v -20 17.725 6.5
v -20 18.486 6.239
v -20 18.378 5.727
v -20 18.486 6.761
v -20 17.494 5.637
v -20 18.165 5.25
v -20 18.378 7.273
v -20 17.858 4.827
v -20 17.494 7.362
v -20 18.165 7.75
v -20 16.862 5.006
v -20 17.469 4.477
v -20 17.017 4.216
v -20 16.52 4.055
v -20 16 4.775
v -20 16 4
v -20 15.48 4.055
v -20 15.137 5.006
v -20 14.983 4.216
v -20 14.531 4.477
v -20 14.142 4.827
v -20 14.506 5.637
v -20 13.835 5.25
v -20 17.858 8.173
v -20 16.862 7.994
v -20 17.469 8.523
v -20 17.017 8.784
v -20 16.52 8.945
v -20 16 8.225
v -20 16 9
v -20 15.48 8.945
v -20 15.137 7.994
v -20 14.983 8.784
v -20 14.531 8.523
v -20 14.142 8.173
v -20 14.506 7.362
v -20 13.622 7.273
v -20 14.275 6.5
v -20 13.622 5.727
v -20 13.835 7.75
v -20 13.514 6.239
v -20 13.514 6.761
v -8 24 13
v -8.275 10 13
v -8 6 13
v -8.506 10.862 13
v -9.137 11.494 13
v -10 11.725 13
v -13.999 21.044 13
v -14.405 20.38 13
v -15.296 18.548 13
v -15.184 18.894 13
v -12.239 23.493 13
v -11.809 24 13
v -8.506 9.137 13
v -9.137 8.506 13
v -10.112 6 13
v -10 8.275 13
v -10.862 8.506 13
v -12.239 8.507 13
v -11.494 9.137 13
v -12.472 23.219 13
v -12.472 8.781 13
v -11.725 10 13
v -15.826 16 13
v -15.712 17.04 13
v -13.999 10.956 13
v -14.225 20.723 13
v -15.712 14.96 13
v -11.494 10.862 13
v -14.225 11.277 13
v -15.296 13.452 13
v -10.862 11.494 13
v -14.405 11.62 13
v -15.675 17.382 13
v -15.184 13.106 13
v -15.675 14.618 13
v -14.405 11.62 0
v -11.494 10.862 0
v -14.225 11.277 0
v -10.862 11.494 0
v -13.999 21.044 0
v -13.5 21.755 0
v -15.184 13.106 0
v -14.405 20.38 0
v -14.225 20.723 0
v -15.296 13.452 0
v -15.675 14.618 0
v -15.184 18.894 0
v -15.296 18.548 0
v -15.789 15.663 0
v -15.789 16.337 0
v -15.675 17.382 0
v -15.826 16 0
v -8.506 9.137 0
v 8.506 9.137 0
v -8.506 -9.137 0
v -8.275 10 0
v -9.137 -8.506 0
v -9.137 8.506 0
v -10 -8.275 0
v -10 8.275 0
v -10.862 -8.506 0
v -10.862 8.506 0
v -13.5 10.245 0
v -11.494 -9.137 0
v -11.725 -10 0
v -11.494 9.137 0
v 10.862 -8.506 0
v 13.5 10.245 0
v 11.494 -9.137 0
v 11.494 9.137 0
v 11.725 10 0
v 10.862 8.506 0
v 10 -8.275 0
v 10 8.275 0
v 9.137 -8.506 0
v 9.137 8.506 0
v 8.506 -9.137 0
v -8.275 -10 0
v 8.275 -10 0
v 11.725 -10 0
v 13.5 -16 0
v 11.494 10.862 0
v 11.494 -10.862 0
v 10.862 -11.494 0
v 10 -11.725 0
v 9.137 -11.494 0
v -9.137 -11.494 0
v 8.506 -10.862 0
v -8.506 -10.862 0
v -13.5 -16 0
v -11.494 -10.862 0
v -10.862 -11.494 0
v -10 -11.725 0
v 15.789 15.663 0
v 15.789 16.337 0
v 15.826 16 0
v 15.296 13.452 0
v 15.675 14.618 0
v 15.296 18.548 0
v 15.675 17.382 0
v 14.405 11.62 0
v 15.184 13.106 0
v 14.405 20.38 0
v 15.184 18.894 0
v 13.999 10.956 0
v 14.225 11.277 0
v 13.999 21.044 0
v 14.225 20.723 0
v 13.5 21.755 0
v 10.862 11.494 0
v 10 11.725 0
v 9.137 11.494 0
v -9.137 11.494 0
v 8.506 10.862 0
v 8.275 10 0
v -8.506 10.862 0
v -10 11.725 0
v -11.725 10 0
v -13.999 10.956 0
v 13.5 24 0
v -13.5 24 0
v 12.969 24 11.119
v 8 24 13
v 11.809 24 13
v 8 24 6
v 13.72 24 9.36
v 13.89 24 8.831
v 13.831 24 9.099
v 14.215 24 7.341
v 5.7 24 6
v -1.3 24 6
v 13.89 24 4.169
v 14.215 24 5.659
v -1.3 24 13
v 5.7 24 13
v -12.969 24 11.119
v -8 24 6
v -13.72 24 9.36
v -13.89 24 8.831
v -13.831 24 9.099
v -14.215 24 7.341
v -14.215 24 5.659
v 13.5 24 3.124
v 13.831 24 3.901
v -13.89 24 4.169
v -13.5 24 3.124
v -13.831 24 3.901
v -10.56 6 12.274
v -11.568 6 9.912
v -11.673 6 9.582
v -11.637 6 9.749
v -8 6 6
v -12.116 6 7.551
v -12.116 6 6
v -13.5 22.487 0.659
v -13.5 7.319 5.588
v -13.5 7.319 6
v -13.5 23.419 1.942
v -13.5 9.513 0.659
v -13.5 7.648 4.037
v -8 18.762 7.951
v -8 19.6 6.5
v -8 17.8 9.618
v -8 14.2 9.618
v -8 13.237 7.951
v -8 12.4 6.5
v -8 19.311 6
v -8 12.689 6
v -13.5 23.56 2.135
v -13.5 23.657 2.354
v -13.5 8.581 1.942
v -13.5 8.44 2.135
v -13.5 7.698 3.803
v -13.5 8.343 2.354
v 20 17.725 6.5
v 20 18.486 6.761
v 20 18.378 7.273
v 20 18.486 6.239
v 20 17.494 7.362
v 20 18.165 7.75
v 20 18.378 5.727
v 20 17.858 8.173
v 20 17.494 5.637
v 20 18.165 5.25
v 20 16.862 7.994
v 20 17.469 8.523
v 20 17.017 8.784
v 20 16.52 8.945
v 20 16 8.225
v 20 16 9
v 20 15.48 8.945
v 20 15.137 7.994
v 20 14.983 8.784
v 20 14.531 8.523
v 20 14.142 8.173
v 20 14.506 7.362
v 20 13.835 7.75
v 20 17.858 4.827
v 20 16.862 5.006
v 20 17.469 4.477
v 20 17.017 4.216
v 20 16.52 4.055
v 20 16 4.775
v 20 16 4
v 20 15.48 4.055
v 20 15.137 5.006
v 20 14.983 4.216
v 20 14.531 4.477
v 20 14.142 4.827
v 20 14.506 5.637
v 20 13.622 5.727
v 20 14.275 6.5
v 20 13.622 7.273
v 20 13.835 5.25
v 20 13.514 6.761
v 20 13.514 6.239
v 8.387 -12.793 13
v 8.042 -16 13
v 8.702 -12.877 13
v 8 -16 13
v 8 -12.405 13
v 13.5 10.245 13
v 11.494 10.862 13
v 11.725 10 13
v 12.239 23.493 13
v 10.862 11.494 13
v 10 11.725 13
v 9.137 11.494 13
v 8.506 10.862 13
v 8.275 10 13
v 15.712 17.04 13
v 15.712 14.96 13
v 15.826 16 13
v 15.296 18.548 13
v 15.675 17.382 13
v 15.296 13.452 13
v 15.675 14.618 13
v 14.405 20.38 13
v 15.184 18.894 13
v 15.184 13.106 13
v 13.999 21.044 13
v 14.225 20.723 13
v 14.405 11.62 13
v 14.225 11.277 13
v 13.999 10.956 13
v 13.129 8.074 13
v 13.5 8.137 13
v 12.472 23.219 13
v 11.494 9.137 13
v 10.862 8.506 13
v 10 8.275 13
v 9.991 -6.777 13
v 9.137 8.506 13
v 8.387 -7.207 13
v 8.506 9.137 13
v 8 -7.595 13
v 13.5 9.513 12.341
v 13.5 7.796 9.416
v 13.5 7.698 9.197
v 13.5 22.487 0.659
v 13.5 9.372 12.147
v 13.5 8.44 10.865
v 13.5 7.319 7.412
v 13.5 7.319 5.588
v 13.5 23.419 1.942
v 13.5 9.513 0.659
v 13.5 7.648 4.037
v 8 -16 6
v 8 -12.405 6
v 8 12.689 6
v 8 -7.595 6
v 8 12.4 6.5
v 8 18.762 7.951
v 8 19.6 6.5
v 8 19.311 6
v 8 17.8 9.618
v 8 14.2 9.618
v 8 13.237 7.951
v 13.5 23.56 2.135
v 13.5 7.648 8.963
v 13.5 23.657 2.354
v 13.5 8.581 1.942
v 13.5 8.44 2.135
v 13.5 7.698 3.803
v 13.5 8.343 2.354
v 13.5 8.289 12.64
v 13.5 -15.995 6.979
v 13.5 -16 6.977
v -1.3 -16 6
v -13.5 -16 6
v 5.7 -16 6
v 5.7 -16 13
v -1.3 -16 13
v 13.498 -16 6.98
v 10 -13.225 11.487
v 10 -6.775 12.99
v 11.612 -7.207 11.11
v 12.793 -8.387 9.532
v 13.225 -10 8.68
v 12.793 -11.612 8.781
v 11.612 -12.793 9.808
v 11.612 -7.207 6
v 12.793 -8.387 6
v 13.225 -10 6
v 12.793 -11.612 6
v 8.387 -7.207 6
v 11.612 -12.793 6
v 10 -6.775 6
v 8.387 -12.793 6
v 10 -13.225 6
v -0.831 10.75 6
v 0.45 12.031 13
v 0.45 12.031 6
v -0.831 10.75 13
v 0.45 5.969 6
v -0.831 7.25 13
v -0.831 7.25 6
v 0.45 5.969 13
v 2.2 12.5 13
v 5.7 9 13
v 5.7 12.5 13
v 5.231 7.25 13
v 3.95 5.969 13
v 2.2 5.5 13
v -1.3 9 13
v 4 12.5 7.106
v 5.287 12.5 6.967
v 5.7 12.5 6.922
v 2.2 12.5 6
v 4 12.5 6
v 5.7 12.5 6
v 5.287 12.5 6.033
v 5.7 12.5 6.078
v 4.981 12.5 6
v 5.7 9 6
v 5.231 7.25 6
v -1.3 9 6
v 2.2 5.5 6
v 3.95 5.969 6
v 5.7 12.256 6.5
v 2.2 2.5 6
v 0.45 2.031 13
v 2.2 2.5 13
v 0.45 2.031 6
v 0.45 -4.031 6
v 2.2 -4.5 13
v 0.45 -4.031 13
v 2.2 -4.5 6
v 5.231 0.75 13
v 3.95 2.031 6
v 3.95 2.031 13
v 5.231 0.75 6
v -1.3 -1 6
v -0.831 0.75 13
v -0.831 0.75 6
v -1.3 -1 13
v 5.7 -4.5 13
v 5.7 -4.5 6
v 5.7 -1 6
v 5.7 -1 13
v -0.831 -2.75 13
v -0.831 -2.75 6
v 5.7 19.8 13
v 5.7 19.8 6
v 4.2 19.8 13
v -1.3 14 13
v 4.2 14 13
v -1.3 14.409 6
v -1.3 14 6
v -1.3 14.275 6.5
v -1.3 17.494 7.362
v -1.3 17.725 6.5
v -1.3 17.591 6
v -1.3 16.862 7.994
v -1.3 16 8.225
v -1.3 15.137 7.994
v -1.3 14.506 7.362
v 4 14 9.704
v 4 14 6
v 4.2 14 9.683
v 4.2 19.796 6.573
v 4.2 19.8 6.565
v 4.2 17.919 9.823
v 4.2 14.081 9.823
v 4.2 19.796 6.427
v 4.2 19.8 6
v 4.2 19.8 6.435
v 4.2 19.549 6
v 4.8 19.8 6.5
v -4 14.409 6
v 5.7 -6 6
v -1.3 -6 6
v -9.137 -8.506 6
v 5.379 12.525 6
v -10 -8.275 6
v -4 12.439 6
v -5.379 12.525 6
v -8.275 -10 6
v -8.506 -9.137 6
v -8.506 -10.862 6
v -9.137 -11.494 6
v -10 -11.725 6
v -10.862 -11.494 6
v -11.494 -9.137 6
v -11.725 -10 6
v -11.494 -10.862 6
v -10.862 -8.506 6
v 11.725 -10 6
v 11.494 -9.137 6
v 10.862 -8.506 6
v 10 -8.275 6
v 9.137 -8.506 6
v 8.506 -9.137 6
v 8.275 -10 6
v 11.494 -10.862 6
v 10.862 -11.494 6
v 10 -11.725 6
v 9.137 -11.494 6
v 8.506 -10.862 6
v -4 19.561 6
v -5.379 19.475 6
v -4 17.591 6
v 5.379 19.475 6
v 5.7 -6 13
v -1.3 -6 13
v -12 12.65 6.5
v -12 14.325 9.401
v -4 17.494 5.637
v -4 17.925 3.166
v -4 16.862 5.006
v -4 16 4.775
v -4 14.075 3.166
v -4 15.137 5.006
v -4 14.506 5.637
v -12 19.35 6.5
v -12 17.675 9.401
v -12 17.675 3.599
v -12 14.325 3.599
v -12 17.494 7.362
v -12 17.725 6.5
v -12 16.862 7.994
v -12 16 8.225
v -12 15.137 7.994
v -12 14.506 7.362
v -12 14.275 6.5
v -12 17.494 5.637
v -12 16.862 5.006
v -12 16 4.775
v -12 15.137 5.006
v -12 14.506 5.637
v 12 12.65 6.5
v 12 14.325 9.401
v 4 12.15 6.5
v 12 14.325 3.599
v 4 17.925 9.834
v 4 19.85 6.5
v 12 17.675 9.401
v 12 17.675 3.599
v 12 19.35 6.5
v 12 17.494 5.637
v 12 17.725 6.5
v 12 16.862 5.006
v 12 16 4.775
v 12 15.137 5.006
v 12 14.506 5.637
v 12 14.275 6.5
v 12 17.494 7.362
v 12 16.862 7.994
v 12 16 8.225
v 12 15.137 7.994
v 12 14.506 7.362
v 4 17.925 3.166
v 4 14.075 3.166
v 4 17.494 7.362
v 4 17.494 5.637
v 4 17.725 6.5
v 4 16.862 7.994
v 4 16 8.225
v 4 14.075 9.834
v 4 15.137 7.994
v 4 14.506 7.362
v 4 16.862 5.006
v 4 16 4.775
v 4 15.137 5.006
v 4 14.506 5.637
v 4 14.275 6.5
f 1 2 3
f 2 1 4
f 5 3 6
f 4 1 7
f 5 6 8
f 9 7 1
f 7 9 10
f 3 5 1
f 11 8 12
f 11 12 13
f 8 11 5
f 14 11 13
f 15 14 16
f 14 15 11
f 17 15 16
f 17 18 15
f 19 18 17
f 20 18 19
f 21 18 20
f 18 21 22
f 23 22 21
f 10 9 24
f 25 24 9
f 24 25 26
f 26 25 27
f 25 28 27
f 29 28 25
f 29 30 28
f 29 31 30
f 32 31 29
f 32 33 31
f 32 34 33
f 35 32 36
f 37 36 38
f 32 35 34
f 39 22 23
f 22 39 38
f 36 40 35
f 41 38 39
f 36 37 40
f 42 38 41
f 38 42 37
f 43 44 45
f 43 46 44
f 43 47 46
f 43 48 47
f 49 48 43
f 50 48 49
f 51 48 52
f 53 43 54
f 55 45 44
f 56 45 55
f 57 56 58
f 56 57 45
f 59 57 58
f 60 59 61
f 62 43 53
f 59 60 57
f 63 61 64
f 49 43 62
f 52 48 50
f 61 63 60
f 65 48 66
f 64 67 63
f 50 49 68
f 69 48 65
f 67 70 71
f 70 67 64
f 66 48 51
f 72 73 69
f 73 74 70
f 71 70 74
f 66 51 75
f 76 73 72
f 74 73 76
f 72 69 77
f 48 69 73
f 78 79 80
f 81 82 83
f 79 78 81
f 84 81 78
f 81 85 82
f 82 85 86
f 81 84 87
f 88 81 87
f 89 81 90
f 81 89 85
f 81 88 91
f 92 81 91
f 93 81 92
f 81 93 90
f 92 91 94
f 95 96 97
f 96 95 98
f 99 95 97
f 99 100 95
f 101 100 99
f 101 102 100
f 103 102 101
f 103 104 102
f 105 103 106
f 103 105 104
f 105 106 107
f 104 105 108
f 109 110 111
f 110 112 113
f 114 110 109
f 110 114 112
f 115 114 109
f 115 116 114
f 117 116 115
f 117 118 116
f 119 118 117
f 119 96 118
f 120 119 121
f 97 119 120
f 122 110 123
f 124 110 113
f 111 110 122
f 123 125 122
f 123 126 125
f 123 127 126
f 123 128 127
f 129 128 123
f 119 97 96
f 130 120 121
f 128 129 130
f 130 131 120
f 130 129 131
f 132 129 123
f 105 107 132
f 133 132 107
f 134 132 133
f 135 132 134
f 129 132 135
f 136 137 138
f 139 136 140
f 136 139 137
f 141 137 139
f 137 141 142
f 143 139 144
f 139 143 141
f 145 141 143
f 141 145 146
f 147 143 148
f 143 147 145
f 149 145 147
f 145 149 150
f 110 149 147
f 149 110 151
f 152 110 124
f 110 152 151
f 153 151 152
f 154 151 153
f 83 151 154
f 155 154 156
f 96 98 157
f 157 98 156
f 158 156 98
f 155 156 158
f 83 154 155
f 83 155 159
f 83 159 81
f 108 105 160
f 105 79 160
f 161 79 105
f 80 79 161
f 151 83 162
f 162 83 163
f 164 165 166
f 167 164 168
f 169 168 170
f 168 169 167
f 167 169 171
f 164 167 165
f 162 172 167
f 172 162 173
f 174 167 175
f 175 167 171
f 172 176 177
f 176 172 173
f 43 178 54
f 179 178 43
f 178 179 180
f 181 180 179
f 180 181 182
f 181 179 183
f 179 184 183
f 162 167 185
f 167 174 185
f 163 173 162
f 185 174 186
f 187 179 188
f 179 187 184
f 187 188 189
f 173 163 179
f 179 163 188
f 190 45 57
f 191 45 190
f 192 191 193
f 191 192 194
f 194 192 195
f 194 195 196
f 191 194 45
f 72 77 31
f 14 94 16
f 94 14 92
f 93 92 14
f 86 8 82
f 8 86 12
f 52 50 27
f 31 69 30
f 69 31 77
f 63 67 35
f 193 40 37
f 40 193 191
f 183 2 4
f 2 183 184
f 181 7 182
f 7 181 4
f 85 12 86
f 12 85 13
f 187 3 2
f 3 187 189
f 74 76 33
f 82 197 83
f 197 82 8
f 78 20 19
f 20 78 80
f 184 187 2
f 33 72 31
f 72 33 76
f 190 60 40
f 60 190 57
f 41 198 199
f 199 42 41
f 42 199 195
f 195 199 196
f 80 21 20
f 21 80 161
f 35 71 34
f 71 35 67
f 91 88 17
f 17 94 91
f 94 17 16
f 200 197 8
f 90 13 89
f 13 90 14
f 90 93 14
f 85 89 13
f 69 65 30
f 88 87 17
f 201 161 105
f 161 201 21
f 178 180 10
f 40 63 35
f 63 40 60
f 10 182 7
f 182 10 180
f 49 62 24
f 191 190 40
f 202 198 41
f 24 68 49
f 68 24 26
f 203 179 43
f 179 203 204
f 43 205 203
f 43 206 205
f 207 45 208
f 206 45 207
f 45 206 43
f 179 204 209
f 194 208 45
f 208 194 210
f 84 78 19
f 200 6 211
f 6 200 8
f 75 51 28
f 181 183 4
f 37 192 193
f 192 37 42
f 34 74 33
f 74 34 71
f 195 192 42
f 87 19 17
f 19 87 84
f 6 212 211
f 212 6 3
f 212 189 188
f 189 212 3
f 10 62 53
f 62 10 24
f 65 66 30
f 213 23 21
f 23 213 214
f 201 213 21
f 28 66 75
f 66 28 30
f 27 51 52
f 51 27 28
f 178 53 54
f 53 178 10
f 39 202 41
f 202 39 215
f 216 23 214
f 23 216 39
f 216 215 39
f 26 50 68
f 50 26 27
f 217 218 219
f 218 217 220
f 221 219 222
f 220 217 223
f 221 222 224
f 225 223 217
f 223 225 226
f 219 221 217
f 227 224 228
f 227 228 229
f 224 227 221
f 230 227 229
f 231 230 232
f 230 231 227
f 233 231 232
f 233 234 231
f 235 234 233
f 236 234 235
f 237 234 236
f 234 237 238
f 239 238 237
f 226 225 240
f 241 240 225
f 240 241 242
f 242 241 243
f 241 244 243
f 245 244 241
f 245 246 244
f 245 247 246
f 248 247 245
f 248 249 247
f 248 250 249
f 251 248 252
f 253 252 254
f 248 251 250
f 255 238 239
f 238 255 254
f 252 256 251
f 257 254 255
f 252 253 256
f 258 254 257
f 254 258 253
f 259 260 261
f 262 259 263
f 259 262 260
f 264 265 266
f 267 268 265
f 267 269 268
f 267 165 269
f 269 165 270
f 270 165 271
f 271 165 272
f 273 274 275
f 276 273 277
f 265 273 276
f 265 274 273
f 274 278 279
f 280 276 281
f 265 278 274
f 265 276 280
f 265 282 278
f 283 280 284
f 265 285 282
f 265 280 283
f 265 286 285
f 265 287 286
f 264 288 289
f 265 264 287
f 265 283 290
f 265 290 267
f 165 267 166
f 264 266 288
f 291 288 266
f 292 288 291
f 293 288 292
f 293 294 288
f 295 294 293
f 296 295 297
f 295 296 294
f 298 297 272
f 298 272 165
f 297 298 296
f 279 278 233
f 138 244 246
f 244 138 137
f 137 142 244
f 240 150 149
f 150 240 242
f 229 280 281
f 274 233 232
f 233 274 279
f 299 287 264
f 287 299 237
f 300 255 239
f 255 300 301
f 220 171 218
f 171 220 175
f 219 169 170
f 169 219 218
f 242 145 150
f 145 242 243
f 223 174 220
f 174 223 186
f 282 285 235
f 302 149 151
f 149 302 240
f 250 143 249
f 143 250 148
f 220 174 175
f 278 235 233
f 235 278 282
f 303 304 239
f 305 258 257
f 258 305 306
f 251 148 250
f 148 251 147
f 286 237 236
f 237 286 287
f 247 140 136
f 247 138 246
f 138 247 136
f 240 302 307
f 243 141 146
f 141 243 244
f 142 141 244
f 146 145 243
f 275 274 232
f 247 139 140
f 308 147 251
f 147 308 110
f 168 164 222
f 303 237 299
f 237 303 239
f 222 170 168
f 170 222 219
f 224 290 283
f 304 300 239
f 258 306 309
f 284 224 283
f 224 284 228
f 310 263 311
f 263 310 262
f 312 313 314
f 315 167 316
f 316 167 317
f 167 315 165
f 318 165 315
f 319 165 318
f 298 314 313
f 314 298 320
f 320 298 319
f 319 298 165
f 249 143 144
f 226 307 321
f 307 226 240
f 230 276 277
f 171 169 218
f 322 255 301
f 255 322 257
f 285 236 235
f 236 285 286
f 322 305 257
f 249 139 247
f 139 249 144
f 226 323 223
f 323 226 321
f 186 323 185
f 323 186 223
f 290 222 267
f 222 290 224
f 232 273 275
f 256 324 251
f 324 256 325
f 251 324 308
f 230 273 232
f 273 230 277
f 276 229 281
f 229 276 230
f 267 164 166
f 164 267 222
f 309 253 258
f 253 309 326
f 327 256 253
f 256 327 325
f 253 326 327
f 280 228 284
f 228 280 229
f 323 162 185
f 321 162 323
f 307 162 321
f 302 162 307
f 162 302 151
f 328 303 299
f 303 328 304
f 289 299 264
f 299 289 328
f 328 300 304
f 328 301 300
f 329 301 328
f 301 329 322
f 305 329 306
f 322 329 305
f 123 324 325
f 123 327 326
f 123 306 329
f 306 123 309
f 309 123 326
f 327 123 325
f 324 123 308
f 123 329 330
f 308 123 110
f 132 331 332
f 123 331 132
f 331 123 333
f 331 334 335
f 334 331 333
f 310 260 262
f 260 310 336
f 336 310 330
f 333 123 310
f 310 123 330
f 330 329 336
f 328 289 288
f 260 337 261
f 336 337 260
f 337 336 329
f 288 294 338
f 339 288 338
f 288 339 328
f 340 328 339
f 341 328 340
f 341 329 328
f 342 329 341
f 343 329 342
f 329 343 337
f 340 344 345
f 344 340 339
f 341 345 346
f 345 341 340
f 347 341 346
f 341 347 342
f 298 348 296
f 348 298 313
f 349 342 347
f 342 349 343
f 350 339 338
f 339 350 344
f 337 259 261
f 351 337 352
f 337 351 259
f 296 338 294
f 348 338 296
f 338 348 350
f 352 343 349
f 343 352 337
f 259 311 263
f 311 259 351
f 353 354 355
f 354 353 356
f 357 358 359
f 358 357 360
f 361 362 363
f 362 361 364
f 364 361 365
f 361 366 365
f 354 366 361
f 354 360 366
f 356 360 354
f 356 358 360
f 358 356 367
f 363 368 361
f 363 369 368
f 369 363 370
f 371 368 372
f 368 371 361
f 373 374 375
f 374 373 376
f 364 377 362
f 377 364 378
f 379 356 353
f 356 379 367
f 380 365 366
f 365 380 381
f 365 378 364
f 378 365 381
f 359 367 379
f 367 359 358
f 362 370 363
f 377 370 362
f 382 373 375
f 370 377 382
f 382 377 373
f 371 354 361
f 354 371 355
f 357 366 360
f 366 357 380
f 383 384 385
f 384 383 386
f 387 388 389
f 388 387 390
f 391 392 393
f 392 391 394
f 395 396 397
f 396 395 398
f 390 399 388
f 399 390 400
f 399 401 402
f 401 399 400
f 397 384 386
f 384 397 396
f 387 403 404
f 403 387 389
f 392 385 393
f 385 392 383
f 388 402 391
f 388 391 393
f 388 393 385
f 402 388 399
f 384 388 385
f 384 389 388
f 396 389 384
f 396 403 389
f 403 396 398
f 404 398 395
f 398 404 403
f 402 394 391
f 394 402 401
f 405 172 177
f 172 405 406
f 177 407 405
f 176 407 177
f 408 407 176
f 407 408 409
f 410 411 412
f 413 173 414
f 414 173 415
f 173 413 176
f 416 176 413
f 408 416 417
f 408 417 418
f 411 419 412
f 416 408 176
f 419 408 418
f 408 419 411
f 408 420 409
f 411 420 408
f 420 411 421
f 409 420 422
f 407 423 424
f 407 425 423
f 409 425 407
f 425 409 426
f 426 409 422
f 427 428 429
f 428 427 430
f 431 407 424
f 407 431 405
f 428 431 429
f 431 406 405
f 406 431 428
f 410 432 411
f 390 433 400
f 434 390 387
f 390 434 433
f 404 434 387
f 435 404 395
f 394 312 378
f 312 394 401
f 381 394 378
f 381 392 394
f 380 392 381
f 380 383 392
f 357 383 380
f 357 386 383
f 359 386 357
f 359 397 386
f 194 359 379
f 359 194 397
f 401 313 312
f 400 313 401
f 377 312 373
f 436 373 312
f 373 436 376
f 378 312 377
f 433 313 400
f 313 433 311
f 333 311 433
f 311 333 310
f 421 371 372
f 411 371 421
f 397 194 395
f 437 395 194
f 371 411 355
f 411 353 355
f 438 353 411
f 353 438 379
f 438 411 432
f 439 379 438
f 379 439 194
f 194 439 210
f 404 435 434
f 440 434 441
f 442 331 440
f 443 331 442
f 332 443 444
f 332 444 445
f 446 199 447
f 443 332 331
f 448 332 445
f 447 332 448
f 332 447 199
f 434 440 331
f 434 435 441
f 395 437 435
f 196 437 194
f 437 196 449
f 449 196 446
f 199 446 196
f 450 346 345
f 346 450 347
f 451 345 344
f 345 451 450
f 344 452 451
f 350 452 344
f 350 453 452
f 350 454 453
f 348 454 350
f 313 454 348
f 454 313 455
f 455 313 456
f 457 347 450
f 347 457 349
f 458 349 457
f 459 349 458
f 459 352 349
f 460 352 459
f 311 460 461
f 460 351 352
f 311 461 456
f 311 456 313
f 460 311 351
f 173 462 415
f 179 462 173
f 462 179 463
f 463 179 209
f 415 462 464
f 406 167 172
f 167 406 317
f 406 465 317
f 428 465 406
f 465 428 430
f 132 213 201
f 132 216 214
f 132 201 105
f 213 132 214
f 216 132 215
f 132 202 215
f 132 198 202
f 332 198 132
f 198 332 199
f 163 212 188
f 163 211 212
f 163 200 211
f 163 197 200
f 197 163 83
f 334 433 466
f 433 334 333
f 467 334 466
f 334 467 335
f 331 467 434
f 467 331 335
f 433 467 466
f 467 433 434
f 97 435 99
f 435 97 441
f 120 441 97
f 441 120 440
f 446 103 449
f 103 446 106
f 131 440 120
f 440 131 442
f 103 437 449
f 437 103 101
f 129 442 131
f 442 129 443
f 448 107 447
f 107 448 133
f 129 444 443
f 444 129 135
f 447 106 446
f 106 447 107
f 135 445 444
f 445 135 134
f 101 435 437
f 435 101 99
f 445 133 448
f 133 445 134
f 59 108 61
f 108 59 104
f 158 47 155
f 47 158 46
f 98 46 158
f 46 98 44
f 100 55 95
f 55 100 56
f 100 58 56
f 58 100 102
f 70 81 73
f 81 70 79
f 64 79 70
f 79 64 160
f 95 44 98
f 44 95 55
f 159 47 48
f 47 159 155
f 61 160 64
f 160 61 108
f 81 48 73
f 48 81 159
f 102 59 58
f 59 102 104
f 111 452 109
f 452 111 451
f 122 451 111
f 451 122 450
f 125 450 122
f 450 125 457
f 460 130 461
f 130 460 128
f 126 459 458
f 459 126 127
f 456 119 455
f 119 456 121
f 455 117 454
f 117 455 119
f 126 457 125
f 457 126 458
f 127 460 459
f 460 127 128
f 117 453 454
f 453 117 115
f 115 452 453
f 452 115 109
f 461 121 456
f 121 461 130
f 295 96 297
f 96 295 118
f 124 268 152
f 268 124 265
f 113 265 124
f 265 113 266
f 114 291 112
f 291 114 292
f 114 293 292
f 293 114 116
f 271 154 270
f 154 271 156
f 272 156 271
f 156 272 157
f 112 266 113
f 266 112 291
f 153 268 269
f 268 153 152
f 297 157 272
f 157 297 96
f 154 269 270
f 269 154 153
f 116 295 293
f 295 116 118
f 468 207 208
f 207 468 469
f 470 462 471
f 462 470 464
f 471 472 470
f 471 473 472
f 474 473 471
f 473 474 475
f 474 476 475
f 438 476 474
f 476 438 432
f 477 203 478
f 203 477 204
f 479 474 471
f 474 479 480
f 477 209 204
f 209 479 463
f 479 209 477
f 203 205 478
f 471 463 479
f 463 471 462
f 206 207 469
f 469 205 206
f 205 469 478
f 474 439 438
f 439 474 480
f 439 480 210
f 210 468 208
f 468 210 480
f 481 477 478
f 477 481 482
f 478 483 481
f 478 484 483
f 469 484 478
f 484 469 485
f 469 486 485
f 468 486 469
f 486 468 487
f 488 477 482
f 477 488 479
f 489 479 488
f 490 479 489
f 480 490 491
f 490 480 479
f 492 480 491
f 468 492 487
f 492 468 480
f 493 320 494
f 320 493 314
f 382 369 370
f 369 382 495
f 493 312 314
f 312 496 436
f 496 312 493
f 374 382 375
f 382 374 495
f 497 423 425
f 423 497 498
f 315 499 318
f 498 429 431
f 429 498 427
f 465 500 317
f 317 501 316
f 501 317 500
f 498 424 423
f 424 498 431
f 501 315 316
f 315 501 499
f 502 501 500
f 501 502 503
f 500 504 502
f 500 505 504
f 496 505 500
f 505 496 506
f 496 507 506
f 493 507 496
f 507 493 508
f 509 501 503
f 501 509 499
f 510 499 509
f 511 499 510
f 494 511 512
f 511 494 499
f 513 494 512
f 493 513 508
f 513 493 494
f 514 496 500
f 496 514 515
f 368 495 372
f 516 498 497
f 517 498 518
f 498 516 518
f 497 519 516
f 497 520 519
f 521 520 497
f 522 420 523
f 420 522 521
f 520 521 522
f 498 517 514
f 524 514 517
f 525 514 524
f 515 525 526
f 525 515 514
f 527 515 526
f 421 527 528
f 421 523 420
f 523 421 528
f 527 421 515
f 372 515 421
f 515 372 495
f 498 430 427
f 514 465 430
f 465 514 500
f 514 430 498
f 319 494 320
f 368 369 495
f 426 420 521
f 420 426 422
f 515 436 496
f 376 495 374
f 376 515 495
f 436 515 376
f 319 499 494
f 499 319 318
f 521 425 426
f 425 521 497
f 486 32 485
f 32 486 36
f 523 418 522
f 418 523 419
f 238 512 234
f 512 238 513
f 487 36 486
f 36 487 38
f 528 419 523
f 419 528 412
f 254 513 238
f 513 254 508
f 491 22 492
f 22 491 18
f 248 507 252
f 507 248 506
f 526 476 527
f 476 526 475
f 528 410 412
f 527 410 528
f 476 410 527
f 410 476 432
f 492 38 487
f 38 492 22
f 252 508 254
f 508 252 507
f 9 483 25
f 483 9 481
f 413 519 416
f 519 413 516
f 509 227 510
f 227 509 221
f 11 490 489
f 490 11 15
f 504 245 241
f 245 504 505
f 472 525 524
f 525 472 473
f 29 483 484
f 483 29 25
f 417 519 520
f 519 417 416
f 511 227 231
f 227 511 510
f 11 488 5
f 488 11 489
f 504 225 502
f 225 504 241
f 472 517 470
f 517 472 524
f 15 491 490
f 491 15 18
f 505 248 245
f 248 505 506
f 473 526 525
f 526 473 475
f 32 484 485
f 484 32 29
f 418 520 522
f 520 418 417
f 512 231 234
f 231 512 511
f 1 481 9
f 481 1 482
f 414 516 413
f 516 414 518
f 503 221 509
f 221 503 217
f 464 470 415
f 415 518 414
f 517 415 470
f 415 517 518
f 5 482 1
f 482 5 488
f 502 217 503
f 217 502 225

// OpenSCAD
// file: configuration.scad
// Increase this if your slicer or printer make holes too tight.
extra_radius = 0.1;

// OD = outside diameter, corner to corner.
m3_nut_od = 6.1;
m3_nut_radius = m3_nut_od/2 + 0.2 + extra_radius;
m3_washer_radius = 3.5 + extra_radius;
m3_nut_thickness = 2.35;
m3_nyloc_thickness = 3.85;

// Major diameter of metric 3mm thread.
m3_major = 2.85;
m3_radius = m3_major/2 + extra_radius;
m3_wide_radius = m3_major/2 + extra_radius + 0.2;

// NEMA17 stepper motors.
motor_shaft_diameter = 5;
motor_shaft_radius = motor_shaft_diameter/2 + extra_radius;

// Frame brackets. M3x8mm screws work best with 3.6 mm brackets.
thickness = 3.6;

// OpenBeam or Misumi. Currently only 15x15 mm, but there is a plan
// to make models more parametric and allow 20x20 mm in the future.
extrusion = 15;

// Placement for the NEMA17 stepper motors.
motor_offset = 44;
motor_length = 47;
// main file
include <configuration.scad>;

separation = 40;
thickness = 6;

horn_thickness = 13;
horn_x = 8;

belt_width = 5;
belt_x = 5.6;
belt_z = 7;
corner_radius = 3.5;

module carriage() {
  // Timing belt (up and down).
  translate([-belt_x, 0, belt_z + belt_width/2]) %
    cube([1.7, 100, belt_width], center=true);
  translate([belt_x+1.23, 0, belt_z + belt_width/2]) %
    cube([2.3, 100, belt_width], center=true);
  difference() {
    union() {
      // Main body.
      translate([0, 4, thickness/2])
        cube([27, 40, thickness], center=true);
      // Ball joint mount horns.
      for (x = [-1, 1]) {
        scale([x, 1, 1]) intersection() {
          translate([0, 15, horn_thickness/2])
            cube([separation, 18, horn_thickness], center=true);
          translate([horn_x, 16, horn_thickness/2]) rotate([0, 90, 0])
            cylinder(r1=14, r2=2.5, h=separation/2-horn_x);
        }
      }

      // Avoid touching diagonal push rods (carbon tube).
      difference() {
        translate([10.75, 2.5, horn_thickness/2+1])
          cube([5.5, 37, horn_thickness-2], center=true);

        translate([23, -12, 12.5]) rotate([30, 40, 30])
          cube([40, 40, 20], center=true);
        translate([10, -10, 0])
          cylinder(r=m3_wide_radius+1.5, h=100, center=true, $fn=12);

      }

      // Belt clamps
      for (y = [[9, -1], [-1, 1]]) {
        translate([2.20, y[0], horn_thickness/2+1])
          color("red") hull() {
            translate([ corner_radius-1,  -y[1] * corner_radius + y[1], 0]) cube([2, 2, horn_thickness-2], center=true);
            cylinder(h=horn_thickness-2, r=corner_radius, $fn=12, center=true);
          }
      }

      // top cube
      translate([2.20, 19, horn_thickness/2+1])
        color("red") difference() {
          cube([7, 10, horn_thickness-2], center=true);
          translate([2.8, -3,1])
            cube([1.6, 7.6, 10], center=true);
        }

      // bottom cube
      translate([2.20, -11, horn_thickness/2+1])
        color("red") cube([7, 10, horn_thickness-2], center=true);
    }

    // Screws for linear slider.
    for (x = [-10, 10]) {
      for (y = [-10, 10]) {
        translate([x, y, thickness]) #
          cylinder(r=m3_wide_radius, h=30, center=true, $fn=12);
      }
    }
    // Screws for ball joints.
    translate([0, 16, horn_thickness/2]) rotate([0, 90, 0]) #
      cylinder(r=m3_wide_radius, h=60, center=true, $fn=12);
    // Lock nuts for ball joints.
    for (x = [-1, 1]) {
      scale([x, 1, 1]) intersection() {
        translate([horn_x, 16, horn_thickness/2]) rotate([90, 0, -90])
          cylinder(r1=m3_nut_radius, r2=m3_nut_radius+0.5, h=8,
                   center=true, $fn=6);
      }
    }
  }
}

carriage();
